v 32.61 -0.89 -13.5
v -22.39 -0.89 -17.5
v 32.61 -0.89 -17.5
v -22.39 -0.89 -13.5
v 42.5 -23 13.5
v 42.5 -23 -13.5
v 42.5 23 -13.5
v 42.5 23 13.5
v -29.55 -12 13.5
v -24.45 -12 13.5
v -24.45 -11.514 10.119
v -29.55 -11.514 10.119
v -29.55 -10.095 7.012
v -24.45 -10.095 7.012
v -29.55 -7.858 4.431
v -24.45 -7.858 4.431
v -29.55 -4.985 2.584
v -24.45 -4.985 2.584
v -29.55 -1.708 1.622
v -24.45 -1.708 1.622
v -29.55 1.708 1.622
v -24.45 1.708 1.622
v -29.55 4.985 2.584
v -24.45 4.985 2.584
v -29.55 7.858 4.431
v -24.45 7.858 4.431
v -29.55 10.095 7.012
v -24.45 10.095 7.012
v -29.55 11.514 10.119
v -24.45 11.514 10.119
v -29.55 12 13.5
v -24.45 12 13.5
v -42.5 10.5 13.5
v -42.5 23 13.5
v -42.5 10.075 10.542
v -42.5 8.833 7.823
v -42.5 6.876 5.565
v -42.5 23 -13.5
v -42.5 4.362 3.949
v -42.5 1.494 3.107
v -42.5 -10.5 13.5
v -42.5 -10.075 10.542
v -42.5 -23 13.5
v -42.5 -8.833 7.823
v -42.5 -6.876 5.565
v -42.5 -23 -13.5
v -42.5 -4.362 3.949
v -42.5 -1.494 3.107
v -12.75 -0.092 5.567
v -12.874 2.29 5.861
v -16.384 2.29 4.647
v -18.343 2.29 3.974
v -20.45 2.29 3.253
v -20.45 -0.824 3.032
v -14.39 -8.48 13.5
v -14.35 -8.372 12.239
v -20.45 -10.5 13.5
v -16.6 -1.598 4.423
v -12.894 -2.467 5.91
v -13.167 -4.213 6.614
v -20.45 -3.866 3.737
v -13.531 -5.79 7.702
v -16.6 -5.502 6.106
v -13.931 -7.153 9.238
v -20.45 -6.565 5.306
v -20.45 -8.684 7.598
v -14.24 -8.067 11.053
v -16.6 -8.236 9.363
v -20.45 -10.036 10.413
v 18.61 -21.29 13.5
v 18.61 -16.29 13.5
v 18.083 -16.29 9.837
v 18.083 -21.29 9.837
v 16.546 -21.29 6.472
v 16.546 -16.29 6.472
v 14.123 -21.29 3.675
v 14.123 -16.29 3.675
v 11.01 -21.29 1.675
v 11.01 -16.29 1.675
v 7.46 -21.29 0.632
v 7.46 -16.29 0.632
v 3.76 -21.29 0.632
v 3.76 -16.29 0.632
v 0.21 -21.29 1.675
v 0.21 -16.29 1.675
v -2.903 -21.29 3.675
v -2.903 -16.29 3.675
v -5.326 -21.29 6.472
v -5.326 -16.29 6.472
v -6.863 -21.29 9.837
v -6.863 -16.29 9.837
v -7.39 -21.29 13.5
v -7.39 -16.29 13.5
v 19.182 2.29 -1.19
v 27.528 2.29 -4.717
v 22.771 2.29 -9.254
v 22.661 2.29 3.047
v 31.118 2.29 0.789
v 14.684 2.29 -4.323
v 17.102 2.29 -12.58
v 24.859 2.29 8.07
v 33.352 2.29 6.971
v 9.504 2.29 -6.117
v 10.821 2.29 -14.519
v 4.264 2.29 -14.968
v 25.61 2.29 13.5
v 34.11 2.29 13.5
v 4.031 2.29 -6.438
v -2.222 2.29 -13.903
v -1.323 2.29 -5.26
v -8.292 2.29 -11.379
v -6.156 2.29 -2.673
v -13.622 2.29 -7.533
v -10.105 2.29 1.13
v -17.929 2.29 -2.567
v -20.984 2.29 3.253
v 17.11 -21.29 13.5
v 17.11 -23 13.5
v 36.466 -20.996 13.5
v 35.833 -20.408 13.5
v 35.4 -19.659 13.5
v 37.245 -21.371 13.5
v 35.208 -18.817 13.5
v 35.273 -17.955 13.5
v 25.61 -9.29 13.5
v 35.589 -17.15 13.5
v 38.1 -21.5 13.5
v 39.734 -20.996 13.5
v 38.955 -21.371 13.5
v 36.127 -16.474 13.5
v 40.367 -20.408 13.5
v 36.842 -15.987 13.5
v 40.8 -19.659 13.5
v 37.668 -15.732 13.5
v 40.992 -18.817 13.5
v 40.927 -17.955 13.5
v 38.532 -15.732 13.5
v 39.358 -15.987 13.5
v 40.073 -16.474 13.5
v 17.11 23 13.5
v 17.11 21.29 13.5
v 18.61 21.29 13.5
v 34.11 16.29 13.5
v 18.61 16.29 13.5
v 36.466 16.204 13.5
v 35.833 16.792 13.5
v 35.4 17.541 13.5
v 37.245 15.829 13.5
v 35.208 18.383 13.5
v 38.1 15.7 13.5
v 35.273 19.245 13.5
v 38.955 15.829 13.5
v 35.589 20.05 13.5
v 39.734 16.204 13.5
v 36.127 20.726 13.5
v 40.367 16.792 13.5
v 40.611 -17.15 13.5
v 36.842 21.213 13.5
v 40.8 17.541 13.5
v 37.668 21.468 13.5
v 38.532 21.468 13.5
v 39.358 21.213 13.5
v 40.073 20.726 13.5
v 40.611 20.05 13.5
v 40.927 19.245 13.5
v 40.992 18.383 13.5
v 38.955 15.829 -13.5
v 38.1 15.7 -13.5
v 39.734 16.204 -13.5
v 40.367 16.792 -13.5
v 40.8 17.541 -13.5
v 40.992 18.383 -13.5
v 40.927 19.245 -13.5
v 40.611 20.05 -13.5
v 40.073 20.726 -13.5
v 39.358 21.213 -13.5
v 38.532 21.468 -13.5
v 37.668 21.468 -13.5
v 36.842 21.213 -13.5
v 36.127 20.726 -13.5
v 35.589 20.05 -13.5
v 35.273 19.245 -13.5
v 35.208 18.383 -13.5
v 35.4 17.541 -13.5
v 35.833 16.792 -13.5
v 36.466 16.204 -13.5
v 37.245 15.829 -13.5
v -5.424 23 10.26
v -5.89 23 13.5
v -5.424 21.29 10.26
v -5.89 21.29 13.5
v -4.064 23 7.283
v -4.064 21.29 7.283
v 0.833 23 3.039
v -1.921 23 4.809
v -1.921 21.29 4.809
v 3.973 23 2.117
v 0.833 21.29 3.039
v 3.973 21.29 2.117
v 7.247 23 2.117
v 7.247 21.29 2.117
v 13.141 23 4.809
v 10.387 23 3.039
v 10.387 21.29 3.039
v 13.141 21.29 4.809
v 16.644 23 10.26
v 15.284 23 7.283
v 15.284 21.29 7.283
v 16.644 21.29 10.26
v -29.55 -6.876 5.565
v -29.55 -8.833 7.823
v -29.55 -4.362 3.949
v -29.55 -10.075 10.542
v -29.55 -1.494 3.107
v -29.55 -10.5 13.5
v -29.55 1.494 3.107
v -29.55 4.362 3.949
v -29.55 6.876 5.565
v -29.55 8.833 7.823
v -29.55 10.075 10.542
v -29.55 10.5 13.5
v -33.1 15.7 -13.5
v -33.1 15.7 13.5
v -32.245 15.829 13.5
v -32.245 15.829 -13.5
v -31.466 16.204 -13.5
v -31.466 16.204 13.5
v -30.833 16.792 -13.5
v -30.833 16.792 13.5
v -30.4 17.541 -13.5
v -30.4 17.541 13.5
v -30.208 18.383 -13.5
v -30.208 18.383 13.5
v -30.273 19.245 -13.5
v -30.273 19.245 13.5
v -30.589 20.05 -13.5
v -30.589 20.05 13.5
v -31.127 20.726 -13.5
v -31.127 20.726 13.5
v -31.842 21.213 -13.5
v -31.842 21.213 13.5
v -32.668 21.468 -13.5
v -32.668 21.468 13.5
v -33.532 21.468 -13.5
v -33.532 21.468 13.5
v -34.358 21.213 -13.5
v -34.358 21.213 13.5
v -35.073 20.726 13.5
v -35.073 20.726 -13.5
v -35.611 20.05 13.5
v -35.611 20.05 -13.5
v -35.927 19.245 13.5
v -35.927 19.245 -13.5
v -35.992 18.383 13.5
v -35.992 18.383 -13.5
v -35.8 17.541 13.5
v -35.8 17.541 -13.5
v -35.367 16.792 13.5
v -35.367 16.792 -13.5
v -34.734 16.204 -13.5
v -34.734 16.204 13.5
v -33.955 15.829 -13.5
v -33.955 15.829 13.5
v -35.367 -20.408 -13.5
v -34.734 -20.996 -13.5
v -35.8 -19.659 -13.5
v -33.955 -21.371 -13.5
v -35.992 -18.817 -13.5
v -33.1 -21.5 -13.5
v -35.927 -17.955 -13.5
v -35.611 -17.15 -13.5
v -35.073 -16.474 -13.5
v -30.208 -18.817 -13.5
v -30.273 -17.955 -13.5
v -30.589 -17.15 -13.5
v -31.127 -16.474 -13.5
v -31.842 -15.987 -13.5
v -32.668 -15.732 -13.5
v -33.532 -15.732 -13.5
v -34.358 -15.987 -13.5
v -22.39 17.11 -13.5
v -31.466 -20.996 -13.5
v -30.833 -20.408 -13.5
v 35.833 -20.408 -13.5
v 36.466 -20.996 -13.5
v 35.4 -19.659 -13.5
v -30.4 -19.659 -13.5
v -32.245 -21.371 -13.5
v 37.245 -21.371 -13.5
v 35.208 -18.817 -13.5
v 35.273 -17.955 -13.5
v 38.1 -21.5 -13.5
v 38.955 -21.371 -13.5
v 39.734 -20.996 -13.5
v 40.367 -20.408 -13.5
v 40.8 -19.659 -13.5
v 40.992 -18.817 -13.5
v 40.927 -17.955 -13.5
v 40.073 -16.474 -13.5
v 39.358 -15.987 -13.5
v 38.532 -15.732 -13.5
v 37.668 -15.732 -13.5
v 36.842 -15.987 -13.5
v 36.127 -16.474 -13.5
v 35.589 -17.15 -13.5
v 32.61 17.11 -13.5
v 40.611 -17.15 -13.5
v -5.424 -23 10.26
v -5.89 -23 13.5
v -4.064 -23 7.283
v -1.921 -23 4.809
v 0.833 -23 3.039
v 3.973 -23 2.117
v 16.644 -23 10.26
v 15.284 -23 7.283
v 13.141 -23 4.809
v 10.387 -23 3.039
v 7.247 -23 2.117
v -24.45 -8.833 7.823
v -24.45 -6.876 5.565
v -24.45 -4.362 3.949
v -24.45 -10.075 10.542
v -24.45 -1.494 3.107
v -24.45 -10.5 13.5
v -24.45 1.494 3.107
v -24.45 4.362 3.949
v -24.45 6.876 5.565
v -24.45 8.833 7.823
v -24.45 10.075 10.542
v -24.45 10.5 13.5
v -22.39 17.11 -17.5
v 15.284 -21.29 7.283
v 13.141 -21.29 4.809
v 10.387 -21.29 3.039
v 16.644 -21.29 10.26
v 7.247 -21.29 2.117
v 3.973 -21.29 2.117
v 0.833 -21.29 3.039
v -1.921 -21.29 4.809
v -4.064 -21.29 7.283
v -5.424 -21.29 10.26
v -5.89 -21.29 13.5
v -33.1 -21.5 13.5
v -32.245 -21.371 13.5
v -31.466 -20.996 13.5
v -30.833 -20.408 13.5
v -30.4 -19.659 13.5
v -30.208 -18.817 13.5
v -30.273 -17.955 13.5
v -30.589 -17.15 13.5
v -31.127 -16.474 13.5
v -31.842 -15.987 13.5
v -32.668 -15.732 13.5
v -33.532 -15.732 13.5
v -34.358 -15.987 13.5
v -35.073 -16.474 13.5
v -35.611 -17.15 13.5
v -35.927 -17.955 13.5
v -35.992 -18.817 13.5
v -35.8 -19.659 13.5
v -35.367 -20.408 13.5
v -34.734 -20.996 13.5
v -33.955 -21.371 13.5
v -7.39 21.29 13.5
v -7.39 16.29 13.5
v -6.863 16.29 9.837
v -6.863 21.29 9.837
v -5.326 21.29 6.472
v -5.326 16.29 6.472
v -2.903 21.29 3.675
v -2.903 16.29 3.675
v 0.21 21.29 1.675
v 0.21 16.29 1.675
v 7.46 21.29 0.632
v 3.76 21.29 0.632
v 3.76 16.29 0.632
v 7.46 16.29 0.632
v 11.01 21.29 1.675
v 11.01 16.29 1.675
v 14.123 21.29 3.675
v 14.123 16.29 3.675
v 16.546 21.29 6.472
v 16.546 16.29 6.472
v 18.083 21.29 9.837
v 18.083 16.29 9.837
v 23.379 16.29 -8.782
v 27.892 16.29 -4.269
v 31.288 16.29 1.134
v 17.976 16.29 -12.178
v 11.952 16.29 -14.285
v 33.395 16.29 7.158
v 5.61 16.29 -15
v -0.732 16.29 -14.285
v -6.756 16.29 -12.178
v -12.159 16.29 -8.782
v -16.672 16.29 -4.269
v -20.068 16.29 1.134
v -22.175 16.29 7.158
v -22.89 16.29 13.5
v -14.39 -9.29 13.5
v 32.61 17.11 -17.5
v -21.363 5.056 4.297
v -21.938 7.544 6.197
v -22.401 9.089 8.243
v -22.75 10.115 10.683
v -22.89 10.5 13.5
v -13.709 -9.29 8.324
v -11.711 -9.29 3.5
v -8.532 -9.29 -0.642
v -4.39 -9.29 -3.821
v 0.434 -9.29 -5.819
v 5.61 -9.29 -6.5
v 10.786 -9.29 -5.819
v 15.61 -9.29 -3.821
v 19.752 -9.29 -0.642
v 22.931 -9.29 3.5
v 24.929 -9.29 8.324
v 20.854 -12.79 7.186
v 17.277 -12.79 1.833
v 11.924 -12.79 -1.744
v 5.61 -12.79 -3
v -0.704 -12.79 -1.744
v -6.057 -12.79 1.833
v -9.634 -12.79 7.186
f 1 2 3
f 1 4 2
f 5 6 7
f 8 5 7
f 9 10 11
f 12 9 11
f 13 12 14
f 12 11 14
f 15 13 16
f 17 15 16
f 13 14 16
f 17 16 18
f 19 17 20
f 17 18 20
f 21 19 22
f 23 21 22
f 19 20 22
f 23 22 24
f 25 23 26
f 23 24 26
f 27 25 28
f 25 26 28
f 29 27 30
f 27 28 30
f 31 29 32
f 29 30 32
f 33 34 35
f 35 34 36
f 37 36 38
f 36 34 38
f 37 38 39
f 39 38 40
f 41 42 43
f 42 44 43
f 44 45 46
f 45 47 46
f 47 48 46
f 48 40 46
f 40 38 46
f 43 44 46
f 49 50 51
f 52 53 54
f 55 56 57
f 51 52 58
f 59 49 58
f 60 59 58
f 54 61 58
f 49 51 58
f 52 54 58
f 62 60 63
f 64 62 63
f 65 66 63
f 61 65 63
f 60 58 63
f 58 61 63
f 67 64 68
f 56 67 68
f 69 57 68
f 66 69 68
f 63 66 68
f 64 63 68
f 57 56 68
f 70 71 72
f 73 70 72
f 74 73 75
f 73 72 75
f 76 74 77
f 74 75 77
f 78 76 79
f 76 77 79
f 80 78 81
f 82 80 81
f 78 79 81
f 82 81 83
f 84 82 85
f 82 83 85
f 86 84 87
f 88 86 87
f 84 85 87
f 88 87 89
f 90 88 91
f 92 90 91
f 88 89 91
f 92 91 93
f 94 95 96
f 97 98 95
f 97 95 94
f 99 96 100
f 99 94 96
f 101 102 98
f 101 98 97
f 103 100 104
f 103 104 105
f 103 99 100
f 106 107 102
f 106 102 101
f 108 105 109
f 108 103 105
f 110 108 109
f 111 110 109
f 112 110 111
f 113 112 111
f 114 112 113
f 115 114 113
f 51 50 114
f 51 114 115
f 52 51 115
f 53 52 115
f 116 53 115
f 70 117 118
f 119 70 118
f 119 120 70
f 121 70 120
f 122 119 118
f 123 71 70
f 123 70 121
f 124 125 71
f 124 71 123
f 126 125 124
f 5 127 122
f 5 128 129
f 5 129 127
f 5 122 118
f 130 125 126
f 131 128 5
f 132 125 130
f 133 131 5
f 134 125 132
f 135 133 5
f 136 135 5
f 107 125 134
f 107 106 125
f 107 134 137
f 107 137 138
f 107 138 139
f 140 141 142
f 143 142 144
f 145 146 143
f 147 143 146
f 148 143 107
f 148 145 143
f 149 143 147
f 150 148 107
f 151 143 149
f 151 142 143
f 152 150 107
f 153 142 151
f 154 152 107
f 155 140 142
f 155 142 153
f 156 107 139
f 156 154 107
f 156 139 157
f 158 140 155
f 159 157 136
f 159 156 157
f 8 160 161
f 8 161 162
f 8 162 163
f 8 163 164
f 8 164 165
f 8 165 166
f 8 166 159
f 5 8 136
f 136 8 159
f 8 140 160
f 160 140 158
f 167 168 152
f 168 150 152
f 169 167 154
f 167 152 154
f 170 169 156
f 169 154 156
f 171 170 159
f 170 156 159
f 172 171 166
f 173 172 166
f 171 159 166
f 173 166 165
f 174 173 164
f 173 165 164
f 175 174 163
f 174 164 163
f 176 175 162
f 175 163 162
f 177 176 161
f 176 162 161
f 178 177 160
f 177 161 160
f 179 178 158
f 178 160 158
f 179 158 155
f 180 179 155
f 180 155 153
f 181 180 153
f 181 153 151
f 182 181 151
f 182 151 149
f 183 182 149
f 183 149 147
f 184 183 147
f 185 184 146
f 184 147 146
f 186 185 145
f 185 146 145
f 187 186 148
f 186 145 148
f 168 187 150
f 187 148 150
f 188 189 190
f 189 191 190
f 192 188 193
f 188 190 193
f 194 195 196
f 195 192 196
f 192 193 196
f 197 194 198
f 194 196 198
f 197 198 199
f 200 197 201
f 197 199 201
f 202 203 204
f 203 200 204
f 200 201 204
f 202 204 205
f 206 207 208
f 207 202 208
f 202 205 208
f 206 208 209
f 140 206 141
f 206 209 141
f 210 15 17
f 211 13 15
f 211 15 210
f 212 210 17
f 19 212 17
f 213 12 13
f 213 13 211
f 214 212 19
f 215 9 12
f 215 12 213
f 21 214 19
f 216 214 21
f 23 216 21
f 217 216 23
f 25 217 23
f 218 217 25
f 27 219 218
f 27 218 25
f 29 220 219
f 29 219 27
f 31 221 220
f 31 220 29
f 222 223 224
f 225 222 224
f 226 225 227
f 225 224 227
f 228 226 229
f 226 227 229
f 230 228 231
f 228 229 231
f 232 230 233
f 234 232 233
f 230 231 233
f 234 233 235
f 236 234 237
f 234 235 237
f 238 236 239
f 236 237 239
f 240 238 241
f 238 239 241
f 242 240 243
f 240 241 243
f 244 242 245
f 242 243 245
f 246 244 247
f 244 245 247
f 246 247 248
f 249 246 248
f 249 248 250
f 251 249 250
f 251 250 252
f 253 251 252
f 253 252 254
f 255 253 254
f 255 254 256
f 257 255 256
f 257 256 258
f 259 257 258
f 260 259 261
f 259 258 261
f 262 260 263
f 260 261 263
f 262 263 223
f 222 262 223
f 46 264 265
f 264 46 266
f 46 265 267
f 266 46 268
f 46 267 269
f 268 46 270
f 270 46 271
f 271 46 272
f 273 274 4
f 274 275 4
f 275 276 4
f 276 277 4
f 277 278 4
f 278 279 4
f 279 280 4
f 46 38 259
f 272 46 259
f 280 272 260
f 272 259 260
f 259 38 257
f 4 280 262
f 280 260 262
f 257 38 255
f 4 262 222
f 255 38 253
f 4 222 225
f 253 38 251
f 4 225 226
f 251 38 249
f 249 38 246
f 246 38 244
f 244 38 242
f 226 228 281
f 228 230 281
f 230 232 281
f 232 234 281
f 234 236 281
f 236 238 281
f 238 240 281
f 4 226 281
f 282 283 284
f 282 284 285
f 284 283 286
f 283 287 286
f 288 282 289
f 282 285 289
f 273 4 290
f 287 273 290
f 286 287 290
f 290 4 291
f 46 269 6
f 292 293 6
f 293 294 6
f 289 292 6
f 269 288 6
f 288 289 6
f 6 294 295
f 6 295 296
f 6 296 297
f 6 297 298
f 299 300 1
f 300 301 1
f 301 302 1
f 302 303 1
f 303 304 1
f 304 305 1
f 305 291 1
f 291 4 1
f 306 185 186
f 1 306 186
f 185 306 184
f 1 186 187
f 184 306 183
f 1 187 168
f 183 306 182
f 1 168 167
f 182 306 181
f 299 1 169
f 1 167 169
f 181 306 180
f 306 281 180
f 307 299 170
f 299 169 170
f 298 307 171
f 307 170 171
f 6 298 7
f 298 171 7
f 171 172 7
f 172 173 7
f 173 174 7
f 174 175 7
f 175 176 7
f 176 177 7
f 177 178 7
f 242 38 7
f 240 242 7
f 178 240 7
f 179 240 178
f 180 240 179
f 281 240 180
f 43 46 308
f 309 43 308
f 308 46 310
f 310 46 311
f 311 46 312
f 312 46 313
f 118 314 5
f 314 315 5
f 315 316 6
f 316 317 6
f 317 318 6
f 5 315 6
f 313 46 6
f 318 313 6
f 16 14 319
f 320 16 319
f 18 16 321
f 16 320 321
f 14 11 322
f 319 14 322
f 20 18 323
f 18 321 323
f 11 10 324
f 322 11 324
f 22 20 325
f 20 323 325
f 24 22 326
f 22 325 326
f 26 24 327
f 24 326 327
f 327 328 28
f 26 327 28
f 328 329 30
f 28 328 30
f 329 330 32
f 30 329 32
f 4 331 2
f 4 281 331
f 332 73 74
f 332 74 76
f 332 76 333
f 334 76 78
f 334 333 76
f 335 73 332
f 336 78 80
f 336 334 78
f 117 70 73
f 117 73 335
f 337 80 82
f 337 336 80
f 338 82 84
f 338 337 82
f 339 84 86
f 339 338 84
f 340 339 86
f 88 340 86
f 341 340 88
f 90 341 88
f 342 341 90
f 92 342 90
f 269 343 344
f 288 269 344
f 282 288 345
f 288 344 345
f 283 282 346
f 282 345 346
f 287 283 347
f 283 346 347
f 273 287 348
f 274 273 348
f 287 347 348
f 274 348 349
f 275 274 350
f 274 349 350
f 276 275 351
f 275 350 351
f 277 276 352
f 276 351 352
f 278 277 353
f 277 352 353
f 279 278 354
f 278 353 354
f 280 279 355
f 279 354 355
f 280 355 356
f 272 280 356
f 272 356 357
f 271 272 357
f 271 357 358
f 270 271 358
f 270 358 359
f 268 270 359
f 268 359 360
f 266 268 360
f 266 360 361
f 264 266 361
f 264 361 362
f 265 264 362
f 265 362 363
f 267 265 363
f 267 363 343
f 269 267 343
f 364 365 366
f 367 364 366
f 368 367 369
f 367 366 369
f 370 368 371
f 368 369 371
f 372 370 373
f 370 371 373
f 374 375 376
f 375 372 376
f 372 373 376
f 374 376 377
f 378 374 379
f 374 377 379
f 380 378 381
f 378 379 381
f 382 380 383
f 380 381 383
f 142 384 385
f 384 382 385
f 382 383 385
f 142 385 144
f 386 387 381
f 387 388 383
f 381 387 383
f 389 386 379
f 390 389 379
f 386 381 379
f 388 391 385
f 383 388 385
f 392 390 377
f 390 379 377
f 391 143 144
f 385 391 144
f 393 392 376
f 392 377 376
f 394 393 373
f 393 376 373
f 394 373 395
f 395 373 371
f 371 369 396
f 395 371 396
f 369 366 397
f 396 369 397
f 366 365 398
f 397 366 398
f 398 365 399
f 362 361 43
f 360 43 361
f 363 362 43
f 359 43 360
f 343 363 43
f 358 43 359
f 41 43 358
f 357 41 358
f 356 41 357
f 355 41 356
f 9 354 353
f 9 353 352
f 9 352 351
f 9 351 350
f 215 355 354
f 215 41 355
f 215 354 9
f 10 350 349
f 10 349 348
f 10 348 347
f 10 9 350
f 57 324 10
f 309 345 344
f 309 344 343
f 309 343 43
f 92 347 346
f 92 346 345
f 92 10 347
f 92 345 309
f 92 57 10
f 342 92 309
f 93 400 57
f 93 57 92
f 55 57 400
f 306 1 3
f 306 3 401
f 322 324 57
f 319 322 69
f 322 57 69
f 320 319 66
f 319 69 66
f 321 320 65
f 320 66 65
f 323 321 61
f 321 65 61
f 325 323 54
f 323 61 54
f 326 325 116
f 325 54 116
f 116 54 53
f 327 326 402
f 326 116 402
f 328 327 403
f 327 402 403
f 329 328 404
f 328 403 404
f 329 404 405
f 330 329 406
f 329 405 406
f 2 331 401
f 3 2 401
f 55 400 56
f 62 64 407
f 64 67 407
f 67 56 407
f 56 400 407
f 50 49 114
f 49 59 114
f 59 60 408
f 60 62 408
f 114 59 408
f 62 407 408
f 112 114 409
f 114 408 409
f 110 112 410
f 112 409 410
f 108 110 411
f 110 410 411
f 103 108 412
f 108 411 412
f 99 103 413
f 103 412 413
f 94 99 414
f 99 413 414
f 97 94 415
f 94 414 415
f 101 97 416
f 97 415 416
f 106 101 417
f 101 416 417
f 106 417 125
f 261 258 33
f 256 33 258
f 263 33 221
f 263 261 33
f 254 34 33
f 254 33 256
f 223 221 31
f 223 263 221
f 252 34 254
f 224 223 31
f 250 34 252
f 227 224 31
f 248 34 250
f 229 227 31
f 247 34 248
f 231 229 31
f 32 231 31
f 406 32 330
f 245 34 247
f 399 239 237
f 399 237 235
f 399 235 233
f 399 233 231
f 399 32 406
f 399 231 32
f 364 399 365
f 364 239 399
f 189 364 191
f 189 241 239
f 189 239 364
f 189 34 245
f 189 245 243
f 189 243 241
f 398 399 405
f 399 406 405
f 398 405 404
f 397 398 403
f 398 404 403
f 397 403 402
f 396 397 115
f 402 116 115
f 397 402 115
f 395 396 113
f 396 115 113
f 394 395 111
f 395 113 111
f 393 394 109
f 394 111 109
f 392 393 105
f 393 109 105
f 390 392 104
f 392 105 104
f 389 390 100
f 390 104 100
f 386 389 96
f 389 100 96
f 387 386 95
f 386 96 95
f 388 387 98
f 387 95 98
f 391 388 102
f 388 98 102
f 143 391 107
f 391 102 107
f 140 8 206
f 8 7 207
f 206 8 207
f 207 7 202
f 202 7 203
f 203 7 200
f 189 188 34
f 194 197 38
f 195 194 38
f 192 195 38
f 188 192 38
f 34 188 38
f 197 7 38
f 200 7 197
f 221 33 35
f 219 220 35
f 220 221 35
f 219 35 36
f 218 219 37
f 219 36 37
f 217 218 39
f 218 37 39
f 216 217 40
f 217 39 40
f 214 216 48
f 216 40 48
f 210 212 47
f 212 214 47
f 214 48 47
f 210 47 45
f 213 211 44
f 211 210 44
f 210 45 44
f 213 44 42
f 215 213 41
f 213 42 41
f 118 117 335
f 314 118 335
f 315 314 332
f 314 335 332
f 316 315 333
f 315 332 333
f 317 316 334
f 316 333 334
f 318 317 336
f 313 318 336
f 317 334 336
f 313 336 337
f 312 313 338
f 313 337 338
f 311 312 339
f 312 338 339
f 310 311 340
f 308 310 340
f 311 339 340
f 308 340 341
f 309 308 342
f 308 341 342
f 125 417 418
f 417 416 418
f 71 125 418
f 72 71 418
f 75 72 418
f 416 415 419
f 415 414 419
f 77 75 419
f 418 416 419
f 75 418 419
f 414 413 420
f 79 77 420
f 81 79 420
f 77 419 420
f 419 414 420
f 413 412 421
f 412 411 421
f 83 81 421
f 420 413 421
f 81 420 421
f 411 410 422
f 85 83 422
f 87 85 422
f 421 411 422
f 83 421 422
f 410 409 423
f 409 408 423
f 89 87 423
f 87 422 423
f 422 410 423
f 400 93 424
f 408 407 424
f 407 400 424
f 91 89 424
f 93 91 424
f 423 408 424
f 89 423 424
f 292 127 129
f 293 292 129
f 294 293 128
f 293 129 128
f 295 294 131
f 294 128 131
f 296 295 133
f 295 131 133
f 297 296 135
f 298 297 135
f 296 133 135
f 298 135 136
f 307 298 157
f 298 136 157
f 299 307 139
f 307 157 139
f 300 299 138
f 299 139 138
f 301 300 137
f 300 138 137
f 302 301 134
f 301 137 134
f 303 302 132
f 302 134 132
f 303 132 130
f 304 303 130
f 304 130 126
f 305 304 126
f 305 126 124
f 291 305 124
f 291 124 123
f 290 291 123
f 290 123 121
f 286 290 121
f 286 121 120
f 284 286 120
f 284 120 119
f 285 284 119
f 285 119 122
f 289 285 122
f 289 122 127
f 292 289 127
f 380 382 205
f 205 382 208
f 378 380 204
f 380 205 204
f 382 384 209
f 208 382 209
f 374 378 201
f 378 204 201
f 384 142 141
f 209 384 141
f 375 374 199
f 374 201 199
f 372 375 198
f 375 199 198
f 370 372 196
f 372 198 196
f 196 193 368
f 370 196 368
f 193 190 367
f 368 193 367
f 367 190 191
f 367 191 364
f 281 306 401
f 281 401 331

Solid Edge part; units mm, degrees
sketch "Sketch1" plane through (0, 0, 0) normal (0, 0, 1) x (1, 0, 0)
  line L0 (-42.5, -23) -> (42.5, -23)
  line L1 (42.5, -23) -> (42.5, 23)
  line L2 (42.5, 23) -> (-42.5, 23)
  line L3 (-42.5, 23) -> (-42.5, -23)
  dimension "D1" = 85
  dimension "D2" = 46
extrude "Protrusion1" add sketch "Sketch1" along normal mid plane 27
sketch "Sketch2" plane through (0, 0, -13.5) normal (0, 0, -1) x (0, 1, 0)
  line L0 (-0.89, 32.61) -> (17.11, 32.61)
  line L1 (17.11, 32.61) -> (17.11, -22.39)
  line L2 (17.11, -22.39) -> (-0.89, -22.39)
  line L3 (-0.89, -22.39) -> (-0.89, 32.61)
  dimension "D1" = 18
  dimension "D2" = 55
  dimension "D3" = 5.89
  dimension "D4" = 9.89
extrude "Extrusionsausprägung_2" add sketch "Sketch2" along normal blind 4
sketch "Sketch3" plane through (0, 0, 13.5) normal (0, 0, 1) x (0, 1, 0)
  line L0 (23, -5.61) -> (23, 5.89)
  line L1 (23, 5.89) -> (21.29, 5.89)
  line L2 (21.29, 5.89) -> (21.29, 7.39)
  line L3 (21.29, 7.39) -> (16.29, 7.39)
  line L4 (16.29, 7.39) -> (16.29, 22.89)
  line L5 (16.29, 22.89) -> (2.29, 22.89)
  line L6 (2.29, 22.89) -> (2.29, 14.39)
  line L7 (2.29, 14.39) -> (-9.29, 14.39)
  line L8 (-9.29, 14.39) -> (-16.29, 7.39)
  line L9 (-21.29, 7.39) -> (-16.29, 7.39)
  line L10 (-21.29, 5.89) -> (-21.29, 7.39)
  line L11 (-23, 5.89) -> (-21.29, 5.89)
  line L12 (-23, -5.61) -> (-23, 5.89)
  dimension "D1" = 36.89
  dimension "D2" = 1.71
  dimension "D3" = 5
  dimension "D4" = 1.71
  dimension "D5" = 5
  dimension "D6" = 14
revolve "RevolvedCutout1" cut sketch "Sketch3" angle 360 about axis through (5.61, -23, 13.5) along (0, 1, 0)
sketch "Sketch4" plane through (-24.195, 0, 13.5) normal (0, 0, 1) x (1, 0, 0)
  line L0 (-5.355, 12) -> (-0.255, 12)
  line L1 (-0.255, 0) -> (-0.255, 12)
  line L2 (-5.355, 0) -> (-0.255, 0)
  line L3 (-5.355, 12) -> (-5.355, 0)
  dimension "D1" = 32.61
  dimension "D2" = 5.1
revolve "RevolvedCutout2" cut sketch "Sketch4" angle 360 about axis through (0, 0, 13.5) along (1, 0, 0)
sketch "Sketch5" plane through (-24.195, 0, 13.5) normal (0, 0, 1) x (1, 0, 0)
  line L0 (-0.255, 10.5) -> (3.745, 10.5)
  line L1 (3.745, 10.5) -> (12.745, 7.5)
  line L2 (12.745, 7.5) -> (12.745, 0)
  line L3 (-0.255, 0) -> (12.745, 0)
  line L4 (-0.255, 10.5) -> (-0.255, 0)
  dimension "D1" = 4
  dimension "D2" = 13
revolve "RevolvedCutout3" cut sketch "Sketch5" angle 360 about axis through (-42.5, 0, 13.5) along (1, 0, 0)
sketch "Sketch6" plane through (-24.195, 0, 13.5) normal (0, 0, 1) x (1, 0, 0)
  line L0 (-18.305, 0) -> (-5.355, 0)
  line L1 (-5.355, 0) -> (-5.355, -10.5)
  line L2 (-5.355, -10.5) -> (-18.305, -10.5)
  line L3 (-18.305, -10.5) -> (-18.305, 0)
revolve "RevolvedCutout4" cut sketch "Sketch6" angle 360 about axis through (0, 0, 13.5) along (1, 0, 0)
hole "Bohrung_1" at (38.1, 18.6, 13.5) direction (0, 0, -1) diameter 5.8 end up to next
hole "Hole1" at (38.1, -18.6, 13.5) direction (0, 0, -1) diameter 5.8 end up to next
hole "Hole2" at (-33.1, -18.6, 13.5) direction (0, 0, -1) diameter 5.8 end up to next
hole "Hole3" at (-33.1, 18.6, 13.5) direction (0, 0, -1) diameter 5.8 end up to next
properties material "Polykarbonat"
